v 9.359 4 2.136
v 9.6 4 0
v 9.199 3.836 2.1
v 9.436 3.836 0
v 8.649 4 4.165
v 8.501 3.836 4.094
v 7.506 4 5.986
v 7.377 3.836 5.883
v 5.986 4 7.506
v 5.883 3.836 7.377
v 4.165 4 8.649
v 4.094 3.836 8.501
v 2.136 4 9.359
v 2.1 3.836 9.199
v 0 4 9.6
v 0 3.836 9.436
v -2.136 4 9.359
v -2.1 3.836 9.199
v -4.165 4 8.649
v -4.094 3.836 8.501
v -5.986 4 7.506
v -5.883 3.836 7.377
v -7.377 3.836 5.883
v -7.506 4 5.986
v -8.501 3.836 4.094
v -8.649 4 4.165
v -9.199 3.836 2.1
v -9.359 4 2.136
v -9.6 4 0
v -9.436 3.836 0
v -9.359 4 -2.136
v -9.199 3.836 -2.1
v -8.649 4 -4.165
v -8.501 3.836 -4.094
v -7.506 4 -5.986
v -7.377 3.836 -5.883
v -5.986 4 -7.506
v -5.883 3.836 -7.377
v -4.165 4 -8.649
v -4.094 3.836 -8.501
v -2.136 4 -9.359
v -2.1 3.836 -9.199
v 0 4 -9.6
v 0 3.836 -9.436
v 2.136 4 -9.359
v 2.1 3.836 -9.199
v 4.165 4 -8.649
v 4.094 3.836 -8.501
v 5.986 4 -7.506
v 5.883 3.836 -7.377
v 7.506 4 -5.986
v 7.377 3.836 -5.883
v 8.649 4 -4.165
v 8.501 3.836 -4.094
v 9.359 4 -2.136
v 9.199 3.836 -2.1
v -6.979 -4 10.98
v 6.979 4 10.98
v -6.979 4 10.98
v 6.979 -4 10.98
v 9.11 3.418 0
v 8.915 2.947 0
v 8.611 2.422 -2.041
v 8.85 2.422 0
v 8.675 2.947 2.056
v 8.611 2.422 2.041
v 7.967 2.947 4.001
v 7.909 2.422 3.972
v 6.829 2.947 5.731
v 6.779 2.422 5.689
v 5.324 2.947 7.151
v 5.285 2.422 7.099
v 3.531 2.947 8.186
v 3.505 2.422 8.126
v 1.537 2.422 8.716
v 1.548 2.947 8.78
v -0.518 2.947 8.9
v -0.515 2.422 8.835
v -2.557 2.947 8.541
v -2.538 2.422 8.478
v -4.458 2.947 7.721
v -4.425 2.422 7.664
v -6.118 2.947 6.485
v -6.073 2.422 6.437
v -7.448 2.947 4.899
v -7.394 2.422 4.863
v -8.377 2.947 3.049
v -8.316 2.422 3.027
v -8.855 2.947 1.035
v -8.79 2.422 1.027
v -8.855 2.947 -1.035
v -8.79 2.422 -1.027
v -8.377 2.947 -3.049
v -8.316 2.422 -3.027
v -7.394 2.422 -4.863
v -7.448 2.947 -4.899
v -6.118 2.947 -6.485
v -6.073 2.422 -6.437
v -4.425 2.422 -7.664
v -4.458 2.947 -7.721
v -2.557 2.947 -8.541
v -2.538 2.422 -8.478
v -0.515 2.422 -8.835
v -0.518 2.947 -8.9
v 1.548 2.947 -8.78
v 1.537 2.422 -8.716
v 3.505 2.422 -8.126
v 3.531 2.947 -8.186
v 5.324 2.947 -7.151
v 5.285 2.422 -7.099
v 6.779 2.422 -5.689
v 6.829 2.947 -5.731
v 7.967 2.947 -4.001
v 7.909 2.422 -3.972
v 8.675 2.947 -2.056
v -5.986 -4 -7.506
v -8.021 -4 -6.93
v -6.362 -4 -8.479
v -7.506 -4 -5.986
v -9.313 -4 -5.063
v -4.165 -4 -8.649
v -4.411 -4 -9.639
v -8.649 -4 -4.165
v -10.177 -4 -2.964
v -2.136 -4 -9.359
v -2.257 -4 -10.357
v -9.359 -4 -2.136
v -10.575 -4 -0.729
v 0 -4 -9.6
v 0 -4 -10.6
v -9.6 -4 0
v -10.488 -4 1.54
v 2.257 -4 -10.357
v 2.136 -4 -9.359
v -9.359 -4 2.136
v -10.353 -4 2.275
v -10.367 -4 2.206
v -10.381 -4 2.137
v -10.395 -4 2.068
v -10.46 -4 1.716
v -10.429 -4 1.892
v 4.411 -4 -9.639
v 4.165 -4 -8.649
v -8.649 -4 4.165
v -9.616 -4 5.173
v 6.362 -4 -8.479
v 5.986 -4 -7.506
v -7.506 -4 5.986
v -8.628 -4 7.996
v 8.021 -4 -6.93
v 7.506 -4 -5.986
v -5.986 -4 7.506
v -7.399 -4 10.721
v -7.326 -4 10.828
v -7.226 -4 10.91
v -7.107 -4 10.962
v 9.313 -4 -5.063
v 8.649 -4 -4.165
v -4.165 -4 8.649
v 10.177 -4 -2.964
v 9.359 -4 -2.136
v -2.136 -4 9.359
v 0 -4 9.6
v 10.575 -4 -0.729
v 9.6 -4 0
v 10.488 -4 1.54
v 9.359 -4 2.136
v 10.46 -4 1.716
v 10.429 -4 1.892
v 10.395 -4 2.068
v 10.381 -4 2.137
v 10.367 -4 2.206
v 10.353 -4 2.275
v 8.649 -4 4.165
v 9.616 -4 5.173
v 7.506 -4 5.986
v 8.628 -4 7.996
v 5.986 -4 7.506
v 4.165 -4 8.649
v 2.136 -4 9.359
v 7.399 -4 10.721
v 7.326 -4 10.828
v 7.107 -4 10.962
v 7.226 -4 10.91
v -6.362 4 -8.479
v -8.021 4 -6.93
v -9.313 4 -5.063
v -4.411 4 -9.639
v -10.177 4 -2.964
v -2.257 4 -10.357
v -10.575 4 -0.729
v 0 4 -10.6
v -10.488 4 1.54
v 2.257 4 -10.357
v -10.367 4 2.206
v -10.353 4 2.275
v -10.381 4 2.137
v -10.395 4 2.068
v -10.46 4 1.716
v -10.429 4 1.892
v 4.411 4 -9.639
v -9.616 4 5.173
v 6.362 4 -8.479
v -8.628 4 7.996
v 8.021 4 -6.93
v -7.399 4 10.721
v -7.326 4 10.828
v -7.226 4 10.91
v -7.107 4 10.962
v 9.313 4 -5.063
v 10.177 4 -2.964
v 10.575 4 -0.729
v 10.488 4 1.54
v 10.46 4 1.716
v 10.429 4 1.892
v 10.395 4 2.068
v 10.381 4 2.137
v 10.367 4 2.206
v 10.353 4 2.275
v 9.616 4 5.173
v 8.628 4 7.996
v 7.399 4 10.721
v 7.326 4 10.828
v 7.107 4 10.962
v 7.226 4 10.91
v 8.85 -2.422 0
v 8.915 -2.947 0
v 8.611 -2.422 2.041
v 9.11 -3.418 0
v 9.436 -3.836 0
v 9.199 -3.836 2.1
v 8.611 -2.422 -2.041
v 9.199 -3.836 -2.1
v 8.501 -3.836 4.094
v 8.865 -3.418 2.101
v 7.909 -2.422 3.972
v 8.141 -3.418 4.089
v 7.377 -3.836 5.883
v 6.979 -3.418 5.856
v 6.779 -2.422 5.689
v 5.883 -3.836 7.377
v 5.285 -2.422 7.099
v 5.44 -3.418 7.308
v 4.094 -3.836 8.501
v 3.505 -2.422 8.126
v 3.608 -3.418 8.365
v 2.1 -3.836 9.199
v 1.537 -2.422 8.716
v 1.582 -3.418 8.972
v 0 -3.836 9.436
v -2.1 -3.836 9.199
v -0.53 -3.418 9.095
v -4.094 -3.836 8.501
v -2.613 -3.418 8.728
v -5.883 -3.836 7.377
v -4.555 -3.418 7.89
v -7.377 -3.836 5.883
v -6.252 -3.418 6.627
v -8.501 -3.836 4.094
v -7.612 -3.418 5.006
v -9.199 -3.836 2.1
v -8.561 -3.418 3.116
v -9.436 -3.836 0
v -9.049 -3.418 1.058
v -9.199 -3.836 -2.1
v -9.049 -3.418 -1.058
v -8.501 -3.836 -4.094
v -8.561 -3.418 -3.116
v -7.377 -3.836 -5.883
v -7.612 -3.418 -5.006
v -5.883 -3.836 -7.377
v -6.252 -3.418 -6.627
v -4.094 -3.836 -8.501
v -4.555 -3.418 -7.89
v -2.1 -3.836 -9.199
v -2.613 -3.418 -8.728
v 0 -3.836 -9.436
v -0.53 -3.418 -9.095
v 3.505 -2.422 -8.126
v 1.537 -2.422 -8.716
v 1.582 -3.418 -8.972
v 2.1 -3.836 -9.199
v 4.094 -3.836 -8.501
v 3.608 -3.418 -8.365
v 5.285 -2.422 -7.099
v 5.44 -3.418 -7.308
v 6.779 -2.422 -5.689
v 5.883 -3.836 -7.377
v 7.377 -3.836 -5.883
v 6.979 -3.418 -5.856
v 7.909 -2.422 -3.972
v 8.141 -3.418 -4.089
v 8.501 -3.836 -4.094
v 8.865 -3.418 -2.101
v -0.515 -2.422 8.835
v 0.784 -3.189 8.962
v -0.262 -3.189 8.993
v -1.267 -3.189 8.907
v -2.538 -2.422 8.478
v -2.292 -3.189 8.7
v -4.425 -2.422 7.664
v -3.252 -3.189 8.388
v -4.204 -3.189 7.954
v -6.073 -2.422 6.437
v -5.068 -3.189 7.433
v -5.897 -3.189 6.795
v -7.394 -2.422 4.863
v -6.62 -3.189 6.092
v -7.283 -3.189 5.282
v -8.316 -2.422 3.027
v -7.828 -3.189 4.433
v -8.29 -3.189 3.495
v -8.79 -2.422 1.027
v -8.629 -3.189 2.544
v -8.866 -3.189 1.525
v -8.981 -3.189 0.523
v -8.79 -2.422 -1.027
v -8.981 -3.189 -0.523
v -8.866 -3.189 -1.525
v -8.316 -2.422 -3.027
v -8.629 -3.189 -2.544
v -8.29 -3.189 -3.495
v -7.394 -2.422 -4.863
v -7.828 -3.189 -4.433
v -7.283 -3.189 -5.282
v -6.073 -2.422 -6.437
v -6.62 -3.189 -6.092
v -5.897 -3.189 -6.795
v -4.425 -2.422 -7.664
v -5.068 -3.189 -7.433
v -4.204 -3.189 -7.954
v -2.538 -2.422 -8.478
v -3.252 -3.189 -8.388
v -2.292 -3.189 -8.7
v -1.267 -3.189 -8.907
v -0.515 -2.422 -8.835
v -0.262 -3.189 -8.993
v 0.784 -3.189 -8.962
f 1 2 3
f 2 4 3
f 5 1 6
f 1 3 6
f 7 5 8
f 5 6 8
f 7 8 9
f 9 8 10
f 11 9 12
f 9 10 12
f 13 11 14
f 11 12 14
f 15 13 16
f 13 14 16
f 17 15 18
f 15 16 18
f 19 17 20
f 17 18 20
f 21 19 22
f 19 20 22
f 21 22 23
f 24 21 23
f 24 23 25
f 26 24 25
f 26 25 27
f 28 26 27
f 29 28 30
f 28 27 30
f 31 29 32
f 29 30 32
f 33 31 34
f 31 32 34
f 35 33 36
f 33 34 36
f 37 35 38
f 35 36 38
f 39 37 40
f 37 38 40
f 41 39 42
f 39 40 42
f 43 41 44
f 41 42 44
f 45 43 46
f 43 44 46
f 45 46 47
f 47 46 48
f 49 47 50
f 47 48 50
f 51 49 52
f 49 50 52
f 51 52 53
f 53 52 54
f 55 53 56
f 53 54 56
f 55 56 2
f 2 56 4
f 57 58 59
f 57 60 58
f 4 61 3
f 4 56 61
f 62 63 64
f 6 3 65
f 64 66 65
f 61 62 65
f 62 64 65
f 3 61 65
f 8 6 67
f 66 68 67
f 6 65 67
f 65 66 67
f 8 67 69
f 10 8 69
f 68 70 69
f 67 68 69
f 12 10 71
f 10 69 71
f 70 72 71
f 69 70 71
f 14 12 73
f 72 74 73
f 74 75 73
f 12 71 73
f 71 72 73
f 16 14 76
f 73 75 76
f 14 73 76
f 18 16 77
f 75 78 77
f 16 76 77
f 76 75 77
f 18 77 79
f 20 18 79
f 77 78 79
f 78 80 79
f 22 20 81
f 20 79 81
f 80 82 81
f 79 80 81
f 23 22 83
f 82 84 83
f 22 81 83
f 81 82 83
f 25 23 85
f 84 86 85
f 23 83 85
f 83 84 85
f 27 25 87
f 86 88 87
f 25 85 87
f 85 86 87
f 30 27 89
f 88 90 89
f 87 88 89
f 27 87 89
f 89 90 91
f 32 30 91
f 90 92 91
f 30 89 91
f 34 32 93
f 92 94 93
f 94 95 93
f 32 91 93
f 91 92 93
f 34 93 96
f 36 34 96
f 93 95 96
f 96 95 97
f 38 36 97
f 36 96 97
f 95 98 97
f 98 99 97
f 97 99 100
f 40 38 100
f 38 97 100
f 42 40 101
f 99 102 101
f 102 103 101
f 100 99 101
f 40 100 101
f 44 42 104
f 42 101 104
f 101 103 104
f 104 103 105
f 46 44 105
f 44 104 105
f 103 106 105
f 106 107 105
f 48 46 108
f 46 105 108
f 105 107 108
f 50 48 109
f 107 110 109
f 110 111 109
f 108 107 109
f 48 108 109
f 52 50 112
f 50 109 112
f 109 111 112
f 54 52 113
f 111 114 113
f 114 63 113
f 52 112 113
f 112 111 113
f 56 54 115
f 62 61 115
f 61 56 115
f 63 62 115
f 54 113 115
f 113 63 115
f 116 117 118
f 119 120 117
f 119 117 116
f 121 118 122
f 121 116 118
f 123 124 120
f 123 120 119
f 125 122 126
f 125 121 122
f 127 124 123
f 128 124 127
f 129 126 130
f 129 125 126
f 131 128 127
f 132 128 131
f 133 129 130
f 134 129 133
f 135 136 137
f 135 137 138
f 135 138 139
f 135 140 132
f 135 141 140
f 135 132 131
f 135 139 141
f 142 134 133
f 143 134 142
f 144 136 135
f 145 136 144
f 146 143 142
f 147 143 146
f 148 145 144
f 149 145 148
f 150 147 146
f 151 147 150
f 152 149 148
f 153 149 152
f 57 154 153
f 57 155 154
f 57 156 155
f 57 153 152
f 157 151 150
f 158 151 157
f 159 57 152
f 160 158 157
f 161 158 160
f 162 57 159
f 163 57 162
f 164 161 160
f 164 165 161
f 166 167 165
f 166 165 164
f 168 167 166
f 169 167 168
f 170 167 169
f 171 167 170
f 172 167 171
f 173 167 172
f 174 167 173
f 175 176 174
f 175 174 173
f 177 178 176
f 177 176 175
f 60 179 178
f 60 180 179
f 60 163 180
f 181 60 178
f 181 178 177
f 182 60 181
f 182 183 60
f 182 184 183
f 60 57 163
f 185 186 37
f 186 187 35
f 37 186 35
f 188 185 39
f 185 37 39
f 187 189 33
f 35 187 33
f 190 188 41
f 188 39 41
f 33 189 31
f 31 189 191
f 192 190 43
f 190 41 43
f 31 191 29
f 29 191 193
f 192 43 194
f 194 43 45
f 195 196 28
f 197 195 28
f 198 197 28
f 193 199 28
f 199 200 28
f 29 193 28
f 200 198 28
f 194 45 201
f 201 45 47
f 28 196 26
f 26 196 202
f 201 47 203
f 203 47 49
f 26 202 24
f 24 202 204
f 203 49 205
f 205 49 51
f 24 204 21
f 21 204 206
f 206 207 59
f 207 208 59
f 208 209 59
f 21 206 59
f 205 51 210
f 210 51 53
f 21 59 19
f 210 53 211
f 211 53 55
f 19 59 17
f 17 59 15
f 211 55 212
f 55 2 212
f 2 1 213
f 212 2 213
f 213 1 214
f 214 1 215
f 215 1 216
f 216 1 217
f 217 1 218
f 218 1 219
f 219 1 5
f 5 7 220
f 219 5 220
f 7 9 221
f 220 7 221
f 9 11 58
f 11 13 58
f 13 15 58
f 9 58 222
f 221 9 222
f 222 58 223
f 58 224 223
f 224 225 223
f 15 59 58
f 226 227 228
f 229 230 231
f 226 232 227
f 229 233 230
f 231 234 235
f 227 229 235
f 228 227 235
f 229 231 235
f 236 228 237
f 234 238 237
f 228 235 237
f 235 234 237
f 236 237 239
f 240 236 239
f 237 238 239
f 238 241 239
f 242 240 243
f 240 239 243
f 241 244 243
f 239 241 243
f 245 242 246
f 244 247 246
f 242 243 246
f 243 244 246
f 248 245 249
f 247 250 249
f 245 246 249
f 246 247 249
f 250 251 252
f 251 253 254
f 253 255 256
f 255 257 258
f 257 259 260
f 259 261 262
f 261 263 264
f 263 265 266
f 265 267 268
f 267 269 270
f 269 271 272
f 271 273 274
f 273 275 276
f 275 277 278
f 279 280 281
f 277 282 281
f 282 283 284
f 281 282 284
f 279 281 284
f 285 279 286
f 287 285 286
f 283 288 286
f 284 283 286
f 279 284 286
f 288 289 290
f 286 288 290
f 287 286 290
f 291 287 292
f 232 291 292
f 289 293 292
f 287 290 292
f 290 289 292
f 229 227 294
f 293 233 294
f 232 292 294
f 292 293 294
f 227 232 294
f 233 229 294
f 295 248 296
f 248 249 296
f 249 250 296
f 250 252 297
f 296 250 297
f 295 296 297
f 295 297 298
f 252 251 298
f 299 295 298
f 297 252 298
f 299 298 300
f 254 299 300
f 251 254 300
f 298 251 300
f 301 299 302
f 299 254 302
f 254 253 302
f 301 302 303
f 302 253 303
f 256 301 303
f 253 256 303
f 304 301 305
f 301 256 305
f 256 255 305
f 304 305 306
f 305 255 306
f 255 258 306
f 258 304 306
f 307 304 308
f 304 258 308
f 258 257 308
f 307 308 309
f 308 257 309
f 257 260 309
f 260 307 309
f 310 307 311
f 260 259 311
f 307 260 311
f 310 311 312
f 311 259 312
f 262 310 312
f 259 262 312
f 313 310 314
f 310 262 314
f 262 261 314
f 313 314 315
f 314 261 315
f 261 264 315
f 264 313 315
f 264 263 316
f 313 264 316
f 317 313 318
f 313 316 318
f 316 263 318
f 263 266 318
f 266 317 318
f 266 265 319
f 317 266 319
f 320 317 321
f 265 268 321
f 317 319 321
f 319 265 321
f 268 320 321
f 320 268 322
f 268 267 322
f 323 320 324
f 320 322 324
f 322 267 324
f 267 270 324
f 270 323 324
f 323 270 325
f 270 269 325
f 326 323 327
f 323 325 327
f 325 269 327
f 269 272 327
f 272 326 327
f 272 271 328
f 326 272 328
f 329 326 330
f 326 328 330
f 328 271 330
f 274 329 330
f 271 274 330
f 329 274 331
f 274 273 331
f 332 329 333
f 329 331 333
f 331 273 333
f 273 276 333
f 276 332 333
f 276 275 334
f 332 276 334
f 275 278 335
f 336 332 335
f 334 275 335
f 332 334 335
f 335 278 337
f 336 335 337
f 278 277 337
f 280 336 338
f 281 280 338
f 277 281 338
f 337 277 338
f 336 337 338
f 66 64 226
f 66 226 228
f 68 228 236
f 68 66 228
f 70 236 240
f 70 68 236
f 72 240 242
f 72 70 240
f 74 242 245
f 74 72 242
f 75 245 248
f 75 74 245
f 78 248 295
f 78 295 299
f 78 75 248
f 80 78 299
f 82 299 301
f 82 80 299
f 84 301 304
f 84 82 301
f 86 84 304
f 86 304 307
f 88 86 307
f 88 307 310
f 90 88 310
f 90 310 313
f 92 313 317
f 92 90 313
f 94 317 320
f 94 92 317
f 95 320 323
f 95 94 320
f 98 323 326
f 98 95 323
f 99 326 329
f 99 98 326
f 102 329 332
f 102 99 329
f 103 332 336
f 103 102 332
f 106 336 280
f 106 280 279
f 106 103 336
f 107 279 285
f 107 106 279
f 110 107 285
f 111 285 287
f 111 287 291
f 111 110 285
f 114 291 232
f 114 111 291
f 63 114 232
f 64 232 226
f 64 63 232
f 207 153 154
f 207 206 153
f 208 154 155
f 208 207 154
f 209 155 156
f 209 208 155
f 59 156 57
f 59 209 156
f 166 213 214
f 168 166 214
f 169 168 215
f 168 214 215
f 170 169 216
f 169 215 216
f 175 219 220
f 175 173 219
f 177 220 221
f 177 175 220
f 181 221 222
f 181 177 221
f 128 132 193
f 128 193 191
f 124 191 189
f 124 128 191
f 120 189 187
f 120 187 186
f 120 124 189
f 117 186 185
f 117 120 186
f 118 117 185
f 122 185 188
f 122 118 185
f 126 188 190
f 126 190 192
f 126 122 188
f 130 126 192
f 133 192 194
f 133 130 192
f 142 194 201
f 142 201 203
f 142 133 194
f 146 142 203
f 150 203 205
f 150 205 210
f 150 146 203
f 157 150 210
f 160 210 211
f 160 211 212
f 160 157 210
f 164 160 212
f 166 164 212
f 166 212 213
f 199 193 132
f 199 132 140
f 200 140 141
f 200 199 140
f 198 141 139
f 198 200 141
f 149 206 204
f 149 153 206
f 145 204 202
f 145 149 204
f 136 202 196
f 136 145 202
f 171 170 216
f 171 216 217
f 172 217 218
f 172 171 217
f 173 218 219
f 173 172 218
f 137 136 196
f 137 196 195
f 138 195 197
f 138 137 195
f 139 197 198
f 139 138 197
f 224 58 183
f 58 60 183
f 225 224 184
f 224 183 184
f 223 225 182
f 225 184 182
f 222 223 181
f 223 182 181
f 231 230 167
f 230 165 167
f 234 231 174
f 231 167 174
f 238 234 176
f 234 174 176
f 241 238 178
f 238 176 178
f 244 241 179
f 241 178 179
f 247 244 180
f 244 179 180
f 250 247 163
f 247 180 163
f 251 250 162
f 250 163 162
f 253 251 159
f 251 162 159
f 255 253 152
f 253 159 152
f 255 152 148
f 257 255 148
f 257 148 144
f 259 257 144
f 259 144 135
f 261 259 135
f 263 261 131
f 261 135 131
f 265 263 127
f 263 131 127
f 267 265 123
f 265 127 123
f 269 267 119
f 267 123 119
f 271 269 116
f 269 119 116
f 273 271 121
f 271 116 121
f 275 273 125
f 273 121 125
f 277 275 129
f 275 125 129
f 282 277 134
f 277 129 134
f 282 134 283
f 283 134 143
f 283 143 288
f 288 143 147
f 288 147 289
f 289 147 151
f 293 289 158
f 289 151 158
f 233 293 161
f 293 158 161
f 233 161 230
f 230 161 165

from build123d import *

# Parameters (mm, degrees)
F0_R          = 8.85
F1_DEPTH      = 4
F1_DEPTH_BACK = 4
F2_T1_DEPTH   = 10.0905704575
F3_SIZE       = 0.75
F4_R          = 0.4704417071


# Not quite as in the source:
# - a fillet or chamfer that OpenCascade refuses, or shapes differently, is made with other operations: its cross-section is extruded or revolved along the edge and cut away or added


with BuildPart() as f1:
    # F0 (on Front) → F1 (new body, two sides)
    with BuildSketch(Plane.XZ) as f1_sk:
        with BuildLine():
            ThreePointArc((-10.4187088027, 1.9520519678), (-0.9802261707, -10.55457989), (10.6, 0))
            ThreePointArc((10.6, 0), (10.55457989, 0.9802261707), (10.4187088027, 1.9520519678))
            ThreePointArc((10.4187088027, 1.9520519678), (10.3862442109, 2.1135702761), (10.3530039199, 2.2749307319))
            ThreePointArc((10.3530039199, 2.2749307319), (0, 10.6), (-10.3530039199, 2.2749307319))
            ThreePointArc((-10.3530039199, 2.2749307319), (-10.3862442109, 2.1135702761), (-10.4187088027, 1.9520519678))
        make_face()
        Circle(F0_R, mode=Mode.SUBTRACT)
        with BuildLine():
            ThreePointArc((-10.3530039199, 2.2749307319), (0, 10.6), (10.3530039199, 2.2749307319))
            ThreePointArc((10.3530039199, 2.2749307319), (9.1045987077, 6.7318445783), (7.2673073852, 10.9800156206))
            Line((7.2673073852, 10.9800156206), (0, 10.9800156206))
            Line((0, 10.9800156206), (-7.2673073852, 10.9800156206))
            ThreePointArc((-7.2673073852, 10.9800156206), (-9.1045987077, 6.7318445783), (-10.3530039199, 2.2749307319))
        make_face()
    extrude(amount=F1_DEPTH)
    extrude(f1_sk.sketch, amount=-F1_DEPTH_BACK)

    # F2: fillet of radius 10 on 2 edges, made by hand

    # F2_s2 → F2_t1 (cut)
    with BuildSketch(Plane.XZ.offset(-5.0452852288)):
        with BuildLine():
            ThreePointArc((-10.4875868169, 1.5396502065), (-10.4450837448, 1.8044143565), (-10.3954968357, 2.0679436806))
            ThreePointArc((-10.3954968357, 2.0679436806), (-10.4071527555, 2.010007826), (-10.4187088027, 1.9520519678))
            ThreePointArc((-10.4187088027, 1.9520519678), (-10.4551813918, 1.7461907295), (-10.4875868169, 1.5396502065))
        make_face()
        with BuildLine():
            ThreePointArc((10.4875868169, 1.5396502065), (10.4450837448, 1.8044143565), (10.3954968357, 2.0679436806))
            ThreePointArc((10.3954968357, 2.0679436806), (10.4071527555, 2.010007826), (10.4187088027, 1.9520519678))
            ThreePointArc((10.4187088027, 1.9520519678), (10.4551813918, 1.7461907295), (10.4875868169, 1.5396502065))
        make_face()
    extrude(amount=F2_T1_DEPTH, mode=Mode.SUBTRACT)

    # F3
    f3_edges = [f1.edges().sort_by_distance(p)[0] for p in [
        (-8.85, 4, 0),
        (-8.85, -4, 0),
    ]]
    chamfer(f3_edges, length=F3_SIZE)

    # F4
    f4_edges = [f1.edges().sort_by_distance(p)[0] for p in [
        (-7.267307, 0, 10.980016),
        (7.267307, 0, 10.980016),
    ]]
    fillet(f4_edges, radius=F4_R)

    # F5: fillet of radius 2 on 2 edges, made by hand

    # F5_s1 → F5_t2 (revolve, cut)
    with BuildSketch(Plane.XY):
        with BuildLine():
            add(Edge.make_bspline(
                [(8.85, -2.4215728753), (8.85, -3.25), (9.4357864376, -3.8357864376)],
                knots=[0, 0, 0, 1, 1, 1], degree=2, weights=[1, 1, 1]))
            Line((9.4357864376, -3.8357864376), (8.85, -3.25))
            Line((8.85, -3.25), (8.85, -2.4215728753))
        make_face()
    revolve(axis=Axis((0, -3.25, 0), (0, -1, 0)), mode=Mode.SUBTRACT)

    # F5_s3 → F5_t4 (revolve, cut)
    with BuildSketch(Plane.XY):
        with BuildLine():
            add(Edge.make_bspline(
                [(9.4357864376, 3.8357864376), (8.85, 3.25), (8.85, 2.4215728753)],
                knots=[0, 0, 0, 1, 1, 1], degree=2, weights=[1, 1, 1]))
            Line((8.85, 2.4215728753), (8.85, 3.25))
            Line((8.85, 3.25), (9.4357864376, 3.8357864376))
        make_face()
    revolve(axis=Axis((0, 3.25, 0), (0, -1, 0)), mode=Mode.SUBTRACT)


solid = f1.part
